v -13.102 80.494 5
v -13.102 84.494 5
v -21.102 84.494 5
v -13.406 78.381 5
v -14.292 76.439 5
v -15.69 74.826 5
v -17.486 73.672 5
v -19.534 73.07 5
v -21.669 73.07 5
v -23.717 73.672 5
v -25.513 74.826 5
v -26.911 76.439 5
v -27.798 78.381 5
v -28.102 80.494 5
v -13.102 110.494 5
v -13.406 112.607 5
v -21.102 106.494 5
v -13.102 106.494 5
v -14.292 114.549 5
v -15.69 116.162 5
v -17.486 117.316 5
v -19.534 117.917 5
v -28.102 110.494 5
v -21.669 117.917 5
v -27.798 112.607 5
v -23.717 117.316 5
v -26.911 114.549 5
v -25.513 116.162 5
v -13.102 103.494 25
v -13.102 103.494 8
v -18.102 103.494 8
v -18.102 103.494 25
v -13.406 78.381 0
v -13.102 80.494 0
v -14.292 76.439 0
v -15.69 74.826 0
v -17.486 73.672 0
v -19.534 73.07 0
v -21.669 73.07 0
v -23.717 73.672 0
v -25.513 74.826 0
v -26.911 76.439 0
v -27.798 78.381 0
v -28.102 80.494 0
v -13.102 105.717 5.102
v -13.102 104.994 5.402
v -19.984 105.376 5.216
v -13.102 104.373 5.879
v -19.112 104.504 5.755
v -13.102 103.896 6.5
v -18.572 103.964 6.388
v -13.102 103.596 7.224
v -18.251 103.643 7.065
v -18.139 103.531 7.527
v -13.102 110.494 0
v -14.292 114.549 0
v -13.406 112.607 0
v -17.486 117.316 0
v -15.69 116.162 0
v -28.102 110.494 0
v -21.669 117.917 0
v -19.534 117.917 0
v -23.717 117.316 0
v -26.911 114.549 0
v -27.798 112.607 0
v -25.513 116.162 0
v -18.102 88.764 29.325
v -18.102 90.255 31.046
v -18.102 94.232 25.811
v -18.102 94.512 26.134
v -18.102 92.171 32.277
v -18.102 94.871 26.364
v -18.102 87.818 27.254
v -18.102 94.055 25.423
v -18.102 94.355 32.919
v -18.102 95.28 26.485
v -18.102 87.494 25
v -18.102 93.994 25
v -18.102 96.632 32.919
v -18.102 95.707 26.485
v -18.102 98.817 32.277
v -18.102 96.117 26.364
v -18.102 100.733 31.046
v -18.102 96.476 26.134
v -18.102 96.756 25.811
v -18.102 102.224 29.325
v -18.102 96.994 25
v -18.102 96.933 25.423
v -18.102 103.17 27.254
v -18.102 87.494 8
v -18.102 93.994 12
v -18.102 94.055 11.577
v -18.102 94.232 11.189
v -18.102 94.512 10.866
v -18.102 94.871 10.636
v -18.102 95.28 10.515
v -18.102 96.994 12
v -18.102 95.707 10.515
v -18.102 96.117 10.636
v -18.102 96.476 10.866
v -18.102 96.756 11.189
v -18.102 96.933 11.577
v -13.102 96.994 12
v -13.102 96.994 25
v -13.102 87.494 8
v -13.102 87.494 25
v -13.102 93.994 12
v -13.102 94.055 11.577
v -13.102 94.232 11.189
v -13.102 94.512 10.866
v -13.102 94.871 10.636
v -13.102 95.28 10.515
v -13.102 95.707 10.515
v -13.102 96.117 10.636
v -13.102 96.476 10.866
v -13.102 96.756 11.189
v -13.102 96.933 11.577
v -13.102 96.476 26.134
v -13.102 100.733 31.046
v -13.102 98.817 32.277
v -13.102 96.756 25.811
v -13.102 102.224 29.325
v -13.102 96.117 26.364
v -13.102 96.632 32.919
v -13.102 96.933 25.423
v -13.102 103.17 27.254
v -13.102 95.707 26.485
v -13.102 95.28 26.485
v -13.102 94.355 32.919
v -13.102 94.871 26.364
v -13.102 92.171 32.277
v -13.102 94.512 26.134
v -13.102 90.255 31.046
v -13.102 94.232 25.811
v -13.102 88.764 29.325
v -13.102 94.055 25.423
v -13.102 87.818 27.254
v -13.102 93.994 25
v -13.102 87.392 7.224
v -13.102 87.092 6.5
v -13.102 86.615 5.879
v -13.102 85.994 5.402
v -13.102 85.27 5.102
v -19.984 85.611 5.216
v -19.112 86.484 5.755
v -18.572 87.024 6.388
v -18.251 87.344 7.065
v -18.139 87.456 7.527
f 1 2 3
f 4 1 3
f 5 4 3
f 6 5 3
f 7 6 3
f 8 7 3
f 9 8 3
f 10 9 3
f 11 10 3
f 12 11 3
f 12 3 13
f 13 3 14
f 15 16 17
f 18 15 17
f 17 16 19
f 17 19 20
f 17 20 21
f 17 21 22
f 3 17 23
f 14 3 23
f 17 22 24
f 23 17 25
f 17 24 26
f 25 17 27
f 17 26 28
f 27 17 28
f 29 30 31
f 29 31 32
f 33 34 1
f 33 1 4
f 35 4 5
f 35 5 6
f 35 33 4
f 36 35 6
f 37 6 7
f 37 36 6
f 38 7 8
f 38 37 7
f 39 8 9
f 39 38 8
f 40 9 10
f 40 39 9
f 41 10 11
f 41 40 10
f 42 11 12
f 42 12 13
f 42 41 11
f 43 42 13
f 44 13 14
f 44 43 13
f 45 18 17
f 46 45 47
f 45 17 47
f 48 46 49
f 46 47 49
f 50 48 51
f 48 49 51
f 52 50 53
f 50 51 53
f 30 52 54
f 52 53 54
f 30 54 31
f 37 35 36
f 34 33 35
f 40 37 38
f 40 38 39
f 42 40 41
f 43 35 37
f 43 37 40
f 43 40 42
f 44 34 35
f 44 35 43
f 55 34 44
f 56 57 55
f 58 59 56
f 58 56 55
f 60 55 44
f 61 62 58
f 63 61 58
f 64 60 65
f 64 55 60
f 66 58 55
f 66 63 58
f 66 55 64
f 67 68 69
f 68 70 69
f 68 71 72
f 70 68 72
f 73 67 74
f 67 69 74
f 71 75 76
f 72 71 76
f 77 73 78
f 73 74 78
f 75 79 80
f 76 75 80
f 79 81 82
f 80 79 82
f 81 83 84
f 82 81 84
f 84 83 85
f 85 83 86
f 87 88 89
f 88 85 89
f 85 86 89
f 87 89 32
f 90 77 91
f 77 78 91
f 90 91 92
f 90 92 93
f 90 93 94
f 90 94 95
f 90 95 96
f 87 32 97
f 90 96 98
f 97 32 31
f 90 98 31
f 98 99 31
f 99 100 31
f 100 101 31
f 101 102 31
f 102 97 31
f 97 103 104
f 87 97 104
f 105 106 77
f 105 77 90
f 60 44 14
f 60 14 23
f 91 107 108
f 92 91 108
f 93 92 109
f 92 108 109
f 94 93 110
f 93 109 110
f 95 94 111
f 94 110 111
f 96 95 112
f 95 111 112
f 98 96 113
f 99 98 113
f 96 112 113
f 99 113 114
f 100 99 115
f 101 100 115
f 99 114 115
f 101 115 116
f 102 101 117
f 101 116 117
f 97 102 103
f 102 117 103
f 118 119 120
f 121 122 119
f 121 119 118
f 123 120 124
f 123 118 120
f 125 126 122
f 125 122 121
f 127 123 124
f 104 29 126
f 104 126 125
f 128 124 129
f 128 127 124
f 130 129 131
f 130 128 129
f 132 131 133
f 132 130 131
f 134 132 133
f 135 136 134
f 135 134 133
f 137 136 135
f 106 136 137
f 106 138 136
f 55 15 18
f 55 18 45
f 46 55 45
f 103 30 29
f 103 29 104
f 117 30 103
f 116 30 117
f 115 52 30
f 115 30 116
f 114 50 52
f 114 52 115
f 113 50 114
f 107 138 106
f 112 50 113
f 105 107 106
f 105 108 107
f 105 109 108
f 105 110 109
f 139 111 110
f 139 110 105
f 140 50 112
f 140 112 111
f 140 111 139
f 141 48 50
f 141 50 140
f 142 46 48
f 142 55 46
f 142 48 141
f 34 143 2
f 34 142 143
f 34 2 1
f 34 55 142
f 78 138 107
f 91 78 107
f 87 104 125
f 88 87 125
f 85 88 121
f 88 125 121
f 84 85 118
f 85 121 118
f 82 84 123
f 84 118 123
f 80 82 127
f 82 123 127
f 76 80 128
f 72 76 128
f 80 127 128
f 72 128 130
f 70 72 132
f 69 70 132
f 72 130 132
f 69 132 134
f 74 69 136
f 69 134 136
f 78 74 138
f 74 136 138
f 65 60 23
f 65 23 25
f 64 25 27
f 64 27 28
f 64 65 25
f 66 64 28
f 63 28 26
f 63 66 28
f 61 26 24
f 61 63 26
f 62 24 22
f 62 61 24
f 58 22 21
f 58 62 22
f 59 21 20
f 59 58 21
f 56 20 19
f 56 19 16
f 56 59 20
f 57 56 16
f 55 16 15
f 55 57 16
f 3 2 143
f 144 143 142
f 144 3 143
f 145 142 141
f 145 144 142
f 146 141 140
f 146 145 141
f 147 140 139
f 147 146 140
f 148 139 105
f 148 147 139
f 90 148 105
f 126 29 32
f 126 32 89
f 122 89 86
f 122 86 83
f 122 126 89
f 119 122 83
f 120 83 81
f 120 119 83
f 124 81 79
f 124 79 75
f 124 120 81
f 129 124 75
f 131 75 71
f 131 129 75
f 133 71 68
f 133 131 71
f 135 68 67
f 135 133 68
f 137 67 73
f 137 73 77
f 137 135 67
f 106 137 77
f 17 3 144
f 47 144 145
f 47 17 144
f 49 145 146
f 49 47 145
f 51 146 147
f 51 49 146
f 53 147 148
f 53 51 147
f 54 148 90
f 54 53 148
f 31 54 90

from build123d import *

# Parameters (mm, degrees)
EXTRUDE_1_DEPTH = 5
EXTRUDE_START   = -15
EXTRUDE_2_DEPTH = 5
FILLET_1_R      = 3


with BuildPart() as part:
    # Эскиз1 → Бобышка-Вытянуть1 (new body)
    with BuildSketch(Plane.XY):
        with BuildLine():
            Line((-13.101757321, 110.493831222), (-13.101757321, 80.493831222))
            ThreePointArc((-13.101757321, 80.493831222), (-20.601757321, 72.993831222), (-28.101757321, 80.493831222))
            Line((-28.101757321, 80.493831222), (-28.101757321, 110.493831222))
            ThreePointArc((-28.101757321, 110.493831222), (-20.601757321, 117.993831222), (-13.101757321, 110.493831222))
        make_face()
    extrude(amount=EXTRUDE_1_DEPTH)

    # Эскиз2 → Бобышка-Вытянуть2 (add)
    with BuildSketch(Plane.ZY.offset(28.101757321).offset(EXTRUDE_START)):
        with BuildLine():
            Line((5, 103.493831222), (25, 103.493831222))
            ThreePointArc((25, 103.493831222), (33, 95.493831222), (25, 87.493831222))
            Line((25, 87.493831222), (5, 87.493831222))
            Line((5, 87.493831222), (5, 103.493831222))
        make_face()
        with BuildLine():
            Line((25, 93.993831222), (12, 93.993831222))
            ThreePointArc((12, 93.993831222), (10.5, 95.493831222), (12, 96.993831222))
            Line((12, 96.993831222), (25, 96.993831222))
            ThreePointArc((25, 96.993831222), (26.5, 95.493831222), (25, 93.993831222))
        make_face(mode=Mode.SUBTRACT)
    extrude(amount=EXTRUDE_2_DEPTH)

    # Скругление1
    fillet_1_edges = [part.edges().sort_by_distance(p)[0] for p in [
        (-18.101757321, 95.493831222, 5),
        (-15.601757321, 87.493831222, 5),
        (-15.601757321, 103.493831222, 5),
    ]]
    fillet(fillet_1_edges, radius=FILLET_1_R)


solid = part.part
